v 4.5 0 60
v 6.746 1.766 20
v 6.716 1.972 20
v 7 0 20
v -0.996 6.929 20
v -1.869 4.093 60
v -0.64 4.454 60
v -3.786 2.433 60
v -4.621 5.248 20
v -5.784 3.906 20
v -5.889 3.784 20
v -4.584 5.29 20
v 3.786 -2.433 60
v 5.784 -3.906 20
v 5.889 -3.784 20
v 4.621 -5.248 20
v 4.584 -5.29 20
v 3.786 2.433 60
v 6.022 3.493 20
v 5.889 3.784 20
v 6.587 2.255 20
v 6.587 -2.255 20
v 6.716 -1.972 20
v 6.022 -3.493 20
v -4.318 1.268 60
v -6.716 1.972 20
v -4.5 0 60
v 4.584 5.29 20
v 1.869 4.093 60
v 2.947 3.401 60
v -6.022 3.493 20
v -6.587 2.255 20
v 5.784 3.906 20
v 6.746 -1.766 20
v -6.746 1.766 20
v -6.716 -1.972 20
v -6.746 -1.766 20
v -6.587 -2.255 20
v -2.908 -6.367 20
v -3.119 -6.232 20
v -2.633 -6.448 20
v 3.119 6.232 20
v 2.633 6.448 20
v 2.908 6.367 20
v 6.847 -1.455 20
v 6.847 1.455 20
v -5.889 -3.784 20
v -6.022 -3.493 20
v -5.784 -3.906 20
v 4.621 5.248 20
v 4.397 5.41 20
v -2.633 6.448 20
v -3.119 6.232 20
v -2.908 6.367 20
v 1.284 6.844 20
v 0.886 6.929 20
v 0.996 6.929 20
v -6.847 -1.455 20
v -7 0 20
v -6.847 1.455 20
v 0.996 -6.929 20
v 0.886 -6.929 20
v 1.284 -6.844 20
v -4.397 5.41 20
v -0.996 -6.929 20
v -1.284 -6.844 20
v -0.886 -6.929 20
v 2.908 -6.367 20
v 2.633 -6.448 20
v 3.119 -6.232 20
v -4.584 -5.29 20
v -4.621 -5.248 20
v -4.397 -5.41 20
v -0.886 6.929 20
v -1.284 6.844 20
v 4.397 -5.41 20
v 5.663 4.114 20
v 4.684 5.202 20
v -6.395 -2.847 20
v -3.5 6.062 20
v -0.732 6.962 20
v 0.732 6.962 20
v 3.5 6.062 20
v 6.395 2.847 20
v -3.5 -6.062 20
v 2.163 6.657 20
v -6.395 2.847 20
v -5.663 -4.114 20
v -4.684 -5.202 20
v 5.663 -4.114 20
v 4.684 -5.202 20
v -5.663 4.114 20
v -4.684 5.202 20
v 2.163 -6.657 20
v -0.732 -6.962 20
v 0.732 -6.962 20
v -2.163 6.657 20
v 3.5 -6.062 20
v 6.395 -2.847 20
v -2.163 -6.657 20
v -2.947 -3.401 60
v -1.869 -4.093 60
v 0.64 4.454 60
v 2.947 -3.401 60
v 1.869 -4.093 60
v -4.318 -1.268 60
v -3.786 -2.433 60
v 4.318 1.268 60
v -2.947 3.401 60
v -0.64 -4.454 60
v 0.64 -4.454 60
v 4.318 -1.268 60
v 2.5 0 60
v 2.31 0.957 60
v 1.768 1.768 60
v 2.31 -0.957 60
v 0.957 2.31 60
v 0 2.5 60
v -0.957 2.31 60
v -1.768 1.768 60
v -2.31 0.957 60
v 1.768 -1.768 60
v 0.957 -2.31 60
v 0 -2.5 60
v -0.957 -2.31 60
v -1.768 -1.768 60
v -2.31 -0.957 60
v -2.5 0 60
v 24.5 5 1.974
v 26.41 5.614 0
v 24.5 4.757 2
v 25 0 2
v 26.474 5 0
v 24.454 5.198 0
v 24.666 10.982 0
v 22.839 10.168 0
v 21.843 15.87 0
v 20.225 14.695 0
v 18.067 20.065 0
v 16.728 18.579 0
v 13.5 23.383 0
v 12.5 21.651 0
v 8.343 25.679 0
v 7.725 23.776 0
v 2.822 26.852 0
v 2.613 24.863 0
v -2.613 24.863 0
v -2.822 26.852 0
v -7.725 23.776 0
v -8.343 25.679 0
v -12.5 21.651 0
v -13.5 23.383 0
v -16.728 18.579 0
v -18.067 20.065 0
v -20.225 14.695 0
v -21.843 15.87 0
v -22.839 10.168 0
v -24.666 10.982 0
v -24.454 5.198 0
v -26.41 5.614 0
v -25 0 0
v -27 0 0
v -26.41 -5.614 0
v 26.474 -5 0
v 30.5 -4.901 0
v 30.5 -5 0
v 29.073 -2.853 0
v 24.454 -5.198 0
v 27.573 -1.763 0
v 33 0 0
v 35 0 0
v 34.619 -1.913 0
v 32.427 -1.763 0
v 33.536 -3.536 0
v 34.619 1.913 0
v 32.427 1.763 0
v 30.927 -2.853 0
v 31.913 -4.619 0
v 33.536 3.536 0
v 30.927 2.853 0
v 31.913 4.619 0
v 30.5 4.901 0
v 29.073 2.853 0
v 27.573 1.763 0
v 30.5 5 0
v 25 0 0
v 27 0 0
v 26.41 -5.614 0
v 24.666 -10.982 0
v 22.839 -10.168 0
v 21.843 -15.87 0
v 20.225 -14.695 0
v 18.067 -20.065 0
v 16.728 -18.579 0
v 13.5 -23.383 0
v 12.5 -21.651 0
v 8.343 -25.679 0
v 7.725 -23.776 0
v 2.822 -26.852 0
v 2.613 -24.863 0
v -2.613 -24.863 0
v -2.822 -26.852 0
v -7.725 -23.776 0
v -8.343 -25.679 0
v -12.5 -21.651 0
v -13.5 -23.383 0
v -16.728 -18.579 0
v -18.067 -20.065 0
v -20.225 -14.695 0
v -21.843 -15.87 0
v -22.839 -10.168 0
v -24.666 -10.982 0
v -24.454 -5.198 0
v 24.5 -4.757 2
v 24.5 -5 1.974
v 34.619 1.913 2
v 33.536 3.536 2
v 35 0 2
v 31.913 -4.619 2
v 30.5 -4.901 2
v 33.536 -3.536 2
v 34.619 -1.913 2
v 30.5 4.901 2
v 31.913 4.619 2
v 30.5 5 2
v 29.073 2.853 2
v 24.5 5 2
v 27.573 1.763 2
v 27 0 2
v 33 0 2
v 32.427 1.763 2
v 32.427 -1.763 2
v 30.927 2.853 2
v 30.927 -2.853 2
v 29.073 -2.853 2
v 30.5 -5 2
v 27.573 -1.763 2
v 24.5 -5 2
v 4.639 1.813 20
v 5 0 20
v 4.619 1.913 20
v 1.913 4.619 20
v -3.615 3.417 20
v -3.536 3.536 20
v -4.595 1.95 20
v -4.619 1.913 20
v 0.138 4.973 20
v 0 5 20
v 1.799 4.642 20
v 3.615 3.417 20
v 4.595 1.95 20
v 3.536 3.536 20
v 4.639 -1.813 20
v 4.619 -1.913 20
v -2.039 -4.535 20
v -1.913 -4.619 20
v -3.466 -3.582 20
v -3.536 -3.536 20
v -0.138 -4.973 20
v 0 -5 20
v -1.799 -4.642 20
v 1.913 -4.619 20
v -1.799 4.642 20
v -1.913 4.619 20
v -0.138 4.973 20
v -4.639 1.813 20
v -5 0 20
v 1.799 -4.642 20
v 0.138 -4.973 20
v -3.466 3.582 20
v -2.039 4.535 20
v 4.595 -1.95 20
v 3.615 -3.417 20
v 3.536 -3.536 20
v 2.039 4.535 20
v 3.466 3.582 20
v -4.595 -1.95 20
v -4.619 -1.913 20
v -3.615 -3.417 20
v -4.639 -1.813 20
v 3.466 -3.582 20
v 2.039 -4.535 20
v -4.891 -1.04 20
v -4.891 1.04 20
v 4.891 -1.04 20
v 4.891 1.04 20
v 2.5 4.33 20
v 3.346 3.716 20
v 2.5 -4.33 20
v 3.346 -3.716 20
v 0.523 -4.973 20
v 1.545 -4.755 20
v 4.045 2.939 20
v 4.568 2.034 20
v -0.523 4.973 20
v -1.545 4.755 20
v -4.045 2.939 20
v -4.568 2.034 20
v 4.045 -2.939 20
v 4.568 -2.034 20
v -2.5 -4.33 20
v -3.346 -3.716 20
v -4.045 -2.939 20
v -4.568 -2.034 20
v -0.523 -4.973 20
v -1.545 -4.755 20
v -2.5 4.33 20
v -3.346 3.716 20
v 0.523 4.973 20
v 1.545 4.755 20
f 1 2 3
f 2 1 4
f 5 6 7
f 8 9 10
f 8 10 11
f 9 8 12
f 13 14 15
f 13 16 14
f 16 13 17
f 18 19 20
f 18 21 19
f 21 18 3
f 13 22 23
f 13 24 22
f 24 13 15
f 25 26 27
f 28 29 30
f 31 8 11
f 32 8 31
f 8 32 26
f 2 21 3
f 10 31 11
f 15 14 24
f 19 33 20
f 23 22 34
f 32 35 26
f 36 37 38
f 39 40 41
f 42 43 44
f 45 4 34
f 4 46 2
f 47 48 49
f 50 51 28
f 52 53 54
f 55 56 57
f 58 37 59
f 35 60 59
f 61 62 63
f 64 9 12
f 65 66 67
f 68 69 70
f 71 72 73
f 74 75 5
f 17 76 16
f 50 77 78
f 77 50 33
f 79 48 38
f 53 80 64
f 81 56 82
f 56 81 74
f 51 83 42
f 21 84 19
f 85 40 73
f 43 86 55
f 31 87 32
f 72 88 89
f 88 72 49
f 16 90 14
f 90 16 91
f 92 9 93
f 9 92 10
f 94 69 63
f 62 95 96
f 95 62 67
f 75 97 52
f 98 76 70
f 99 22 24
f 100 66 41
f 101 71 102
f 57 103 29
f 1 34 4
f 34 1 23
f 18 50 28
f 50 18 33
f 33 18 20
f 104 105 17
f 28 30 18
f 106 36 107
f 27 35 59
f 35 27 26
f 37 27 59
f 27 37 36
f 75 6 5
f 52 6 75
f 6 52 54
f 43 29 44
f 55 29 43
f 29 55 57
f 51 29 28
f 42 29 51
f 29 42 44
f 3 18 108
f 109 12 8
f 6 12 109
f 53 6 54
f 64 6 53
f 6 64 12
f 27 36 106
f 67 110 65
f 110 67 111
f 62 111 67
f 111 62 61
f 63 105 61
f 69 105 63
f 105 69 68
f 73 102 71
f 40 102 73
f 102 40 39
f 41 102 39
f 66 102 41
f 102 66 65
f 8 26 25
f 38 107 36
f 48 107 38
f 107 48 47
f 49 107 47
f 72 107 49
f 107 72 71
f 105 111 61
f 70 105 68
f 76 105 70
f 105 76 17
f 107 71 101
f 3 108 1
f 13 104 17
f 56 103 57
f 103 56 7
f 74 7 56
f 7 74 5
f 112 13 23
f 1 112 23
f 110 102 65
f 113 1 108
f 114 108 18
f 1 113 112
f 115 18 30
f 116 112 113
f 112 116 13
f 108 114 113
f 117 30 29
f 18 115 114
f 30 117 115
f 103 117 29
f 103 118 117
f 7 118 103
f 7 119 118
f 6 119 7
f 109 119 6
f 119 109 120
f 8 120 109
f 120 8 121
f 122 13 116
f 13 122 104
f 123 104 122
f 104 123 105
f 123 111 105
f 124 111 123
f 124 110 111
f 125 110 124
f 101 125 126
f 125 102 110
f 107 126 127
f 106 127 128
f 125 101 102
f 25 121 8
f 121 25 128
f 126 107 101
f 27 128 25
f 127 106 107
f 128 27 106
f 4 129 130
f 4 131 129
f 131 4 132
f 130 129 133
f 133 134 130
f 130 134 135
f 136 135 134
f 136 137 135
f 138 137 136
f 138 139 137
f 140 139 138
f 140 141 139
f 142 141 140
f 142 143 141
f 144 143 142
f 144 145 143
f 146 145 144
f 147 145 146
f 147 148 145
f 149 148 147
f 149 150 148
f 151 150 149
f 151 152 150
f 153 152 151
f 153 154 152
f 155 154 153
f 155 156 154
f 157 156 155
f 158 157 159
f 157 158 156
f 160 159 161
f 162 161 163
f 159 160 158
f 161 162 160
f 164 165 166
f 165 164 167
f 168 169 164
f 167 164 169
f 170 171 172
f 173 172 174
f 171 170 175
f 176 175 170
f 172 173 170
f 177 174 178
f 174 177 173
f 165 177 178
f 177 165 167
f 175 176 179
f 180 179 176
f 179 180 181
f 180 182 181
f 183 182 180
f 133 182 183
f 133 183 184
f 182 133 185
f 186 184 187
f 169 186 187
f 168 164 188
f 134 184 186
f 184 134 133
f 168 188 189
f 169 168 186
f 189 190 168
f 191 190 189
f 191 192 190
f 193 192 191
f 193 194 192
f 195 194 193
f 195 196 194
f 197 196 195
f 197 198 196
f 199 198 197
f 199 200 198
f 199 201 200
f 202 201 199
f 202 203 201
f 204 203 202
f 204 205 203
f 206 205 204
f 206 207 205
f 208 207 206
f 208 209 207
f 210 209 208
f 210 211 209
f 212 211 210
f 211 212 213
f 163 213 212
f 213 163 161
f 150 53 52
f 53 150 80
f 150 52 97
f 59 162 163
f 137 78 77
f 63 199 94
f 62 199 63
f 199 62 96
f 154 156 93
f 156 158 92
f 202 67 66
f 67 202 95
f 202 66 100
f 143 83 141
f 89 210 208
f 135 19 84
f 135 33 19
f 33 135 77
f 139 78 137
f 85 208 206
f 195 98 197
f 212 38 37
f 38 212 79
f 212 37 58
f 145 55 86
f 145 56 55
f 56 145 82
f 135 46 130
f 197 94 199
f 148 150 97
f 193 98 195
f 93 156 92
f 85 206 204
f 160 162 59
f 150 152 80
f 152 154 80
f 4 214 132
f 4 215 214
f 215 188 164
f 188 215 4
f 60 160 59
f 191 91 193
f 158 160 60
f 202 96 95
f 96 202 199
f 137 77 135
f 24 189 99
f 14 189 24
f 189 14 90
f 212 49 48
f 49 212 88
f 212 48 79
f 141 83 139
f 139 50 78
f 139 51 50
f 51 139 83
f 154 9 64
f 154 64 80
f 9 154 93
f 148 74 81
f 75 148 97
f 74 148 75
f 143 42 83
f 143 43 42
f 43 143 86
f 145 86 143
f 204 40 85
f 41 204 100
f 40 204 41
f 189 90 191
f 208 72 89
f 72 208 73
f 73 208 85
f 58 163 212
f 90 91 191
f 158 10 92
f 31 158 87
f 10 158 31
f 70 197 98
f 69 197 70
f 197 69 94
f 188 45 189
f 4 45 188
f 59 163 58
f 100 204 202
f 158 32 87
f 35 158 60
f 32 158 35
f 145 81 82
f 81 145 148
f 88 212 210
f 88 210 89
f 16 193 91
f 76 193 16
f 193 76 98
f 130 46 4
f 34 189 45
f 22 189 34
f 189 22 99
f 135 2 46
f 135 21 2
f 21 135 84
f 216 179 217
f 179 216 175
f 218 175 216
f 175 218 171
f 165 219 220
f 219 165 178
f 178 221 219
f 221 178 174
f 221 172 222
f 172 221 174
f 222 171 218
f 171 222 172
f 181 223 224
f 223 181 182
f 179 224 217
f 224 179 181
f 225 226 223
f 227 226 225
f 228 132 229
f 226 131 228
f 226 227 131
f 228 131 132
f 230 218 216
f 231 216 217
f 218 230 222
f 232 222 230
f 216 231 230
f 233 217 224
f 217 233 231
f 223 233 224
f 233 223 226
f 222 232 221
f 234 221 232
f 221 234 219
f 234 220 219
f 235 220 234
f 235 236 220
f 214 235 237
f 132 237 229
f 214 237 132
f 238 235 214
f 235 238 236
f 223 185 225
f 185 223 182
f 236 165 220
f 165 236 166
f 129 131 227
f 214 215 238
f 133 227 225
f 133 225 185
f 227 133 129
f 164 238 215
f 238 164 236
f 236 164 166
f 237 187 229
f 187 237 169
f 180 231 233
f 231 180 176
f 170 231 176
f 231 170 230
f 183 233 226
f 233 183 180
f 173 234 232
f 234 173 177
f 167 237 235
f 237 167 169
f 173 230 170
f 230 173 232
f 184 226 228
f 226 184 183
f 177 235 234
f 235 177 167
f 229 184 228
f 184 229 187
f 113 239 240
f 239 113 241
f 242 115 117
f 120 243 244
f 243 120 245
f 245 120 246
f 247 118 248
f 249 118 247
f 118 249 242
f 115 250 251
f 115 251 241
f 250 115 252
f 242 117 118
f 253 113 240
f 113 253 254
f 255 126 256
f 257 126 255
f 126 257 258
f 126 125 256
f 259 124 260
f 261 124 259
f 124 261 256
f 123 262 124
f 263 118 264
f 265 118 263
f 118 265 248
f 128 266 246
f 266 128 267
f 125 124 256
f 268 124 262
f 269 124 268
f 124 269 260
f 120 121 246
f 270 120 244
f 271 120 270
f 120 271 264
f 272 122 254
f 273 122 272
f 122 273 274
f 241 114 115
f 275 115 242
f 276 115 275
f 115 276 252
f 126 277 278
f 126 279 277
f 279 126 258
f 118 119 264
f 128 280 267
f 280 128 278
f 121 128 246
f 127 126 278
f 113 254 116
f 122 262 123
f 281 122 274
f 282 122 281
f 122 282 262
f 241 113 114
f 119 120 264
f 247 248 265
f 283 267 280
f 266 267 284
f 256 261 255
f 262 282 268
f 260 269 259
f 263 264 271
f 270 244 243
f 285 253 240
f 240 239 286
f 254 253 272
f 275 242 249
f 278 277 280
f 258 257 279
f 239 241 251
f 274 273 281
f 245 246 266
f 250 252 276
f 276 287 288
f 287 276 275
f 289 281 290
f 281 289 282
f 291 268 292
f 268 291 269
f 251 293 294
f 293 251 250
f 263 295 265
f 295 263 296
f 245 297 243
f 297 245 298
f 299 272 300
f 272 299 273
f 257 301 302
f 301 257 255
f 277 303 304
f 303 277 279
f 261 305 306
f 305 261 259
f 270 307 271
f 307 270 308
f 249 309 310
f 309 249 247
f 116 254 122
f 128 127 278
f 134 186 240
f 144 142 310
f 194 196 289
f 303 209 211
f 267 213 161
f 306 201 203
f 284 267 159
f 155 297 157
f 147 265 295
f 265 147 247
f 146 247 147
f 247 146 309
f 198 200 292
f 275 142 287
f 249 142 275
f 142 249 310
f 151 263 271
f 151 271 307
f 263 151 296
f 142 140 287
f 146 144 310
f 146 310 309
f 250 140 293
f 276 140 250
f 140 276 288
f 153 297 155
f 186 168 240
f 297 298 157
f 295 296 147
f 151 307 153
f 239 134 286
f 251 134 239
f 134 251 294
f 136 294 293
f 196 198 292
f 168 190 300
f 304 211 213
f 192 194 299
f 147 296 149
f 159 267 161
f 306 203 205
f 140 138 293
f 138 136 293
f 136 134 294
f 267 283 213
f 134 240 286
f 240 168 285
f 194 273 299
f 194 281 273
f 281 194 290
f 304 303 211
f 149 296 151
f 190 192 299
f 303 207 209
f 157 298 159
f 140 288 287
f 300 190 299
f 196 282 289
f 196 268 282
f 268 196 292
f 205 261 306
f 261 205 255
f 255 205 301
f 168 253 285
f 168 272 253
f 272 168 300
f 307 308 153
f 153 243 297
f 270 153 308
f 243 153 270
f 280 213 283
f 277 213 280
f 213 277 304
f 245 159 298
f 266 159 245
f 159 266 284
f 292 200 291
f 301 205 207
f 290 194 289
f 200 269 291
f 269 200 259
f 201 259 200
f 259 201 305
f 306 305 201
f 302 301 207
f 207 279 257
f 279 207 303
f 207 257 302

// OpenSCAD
/*
 * CustomFunnel.scad:  A 3D printable parametric funnel
 * 
 * Written by Steven Morlock, smorloc@gmail.com
 *
 * This script is licensed under the Creative Commons Attribution - Share Alike license:
 *     http://creativecommons.org/licenses/by-sa/3.0/
 *
 */

//preview[view:south,tilt:top]

//CUSTOMIZER VARIABLES

// in millimeters
wall_thickness = 2.0;
// in millimeters
cone_height =  20; //[[1:200]]
// Funnel interior diameter in millimeters
cone_diameter =  50; //[[1:200]]
// in millmeters
neck_height = 40; //[[1:200]]
// Top of neck interior diameter in millimeters
neck_diameter = 10; //[[1:200]]
// Exit hole interiod diameter in millimeters
exit_diameter = 5; //[[1:50]]
// Handle diameter in millmeters
handle_diameter = 10; //[[1:50]]
// Hole in handle diameter in millmeters
handle_hole_diameter = 6; //[[1:50]]

//CUSTOMIZER VARIABLES END

WallThickness = wall_thickness;
NeckHeight = neck_height;
NeckDiameter = neck_diameter;
ConeHeight =  cone_height;
ConeDiameter =  cone_diameter;
ExitDiameter = exit_diameter;
HandleDiameter = handle_diameter;
HandleHoleDiameter = handle_hole_diameter;

makeFunnel();

module makeFunnel()
{
    // Funnel
    difference() {
        union() {
            // Outside of funnel
            funnel(
                    ConeHeight, 
                    ConeDiameter,
                    NeckHeight, 
                    NeckDiameter, 
                    ExitDiameter, 
                    WallThickness);
                    

            // Handle
            translate([ConeDiameter / 2 + WallThickness + HandleHoleDiameter / 2, 0, 0]) {
                difference() {
                    union() {
                        cylinder(WallThickness, r1 = HandleDiameter / 2, r2 = HandleDiameter / 2);
                        translate ([-HandleDiameter / 4, 0, WallThickness / 2]) {
                            cube([HandleHoleDiameter, HandleDiameter, WallThickness], center = true);
                        }
                    }
                    cylinder(WallThickness, r1 = HandleHoleDiameter / 2, r2 = HandleHoleDiameter/ 2);
                }
            }
        }
        
        // Interior of funnel
        funnel(
                ConeHeight, 
                ConeDiameter,
                NeckHeight, 
                NeckDiameter, 
                ExitDiameter, 
                0);
    }
}

module funnel(coneHeight, coneDiameter, neckHeight, neckDiameter, exitDiameter, wallThickness)
{
	union() {
        // Neck
		translate([0, 0, coneHeight]) {
			cylinder(
                    neckHeight, 
                    r1 = neckDiameter/2 + wallThickness, 
                    r2 = exitDiameter/2 + wallThickness);
		}
        // Cone
        cylinder(
                coneHeight, 
                r1 = coneDiameter/2 + wallThickness, 
                r2 = neckDiameter/2 + wallThickness);
	}
}
